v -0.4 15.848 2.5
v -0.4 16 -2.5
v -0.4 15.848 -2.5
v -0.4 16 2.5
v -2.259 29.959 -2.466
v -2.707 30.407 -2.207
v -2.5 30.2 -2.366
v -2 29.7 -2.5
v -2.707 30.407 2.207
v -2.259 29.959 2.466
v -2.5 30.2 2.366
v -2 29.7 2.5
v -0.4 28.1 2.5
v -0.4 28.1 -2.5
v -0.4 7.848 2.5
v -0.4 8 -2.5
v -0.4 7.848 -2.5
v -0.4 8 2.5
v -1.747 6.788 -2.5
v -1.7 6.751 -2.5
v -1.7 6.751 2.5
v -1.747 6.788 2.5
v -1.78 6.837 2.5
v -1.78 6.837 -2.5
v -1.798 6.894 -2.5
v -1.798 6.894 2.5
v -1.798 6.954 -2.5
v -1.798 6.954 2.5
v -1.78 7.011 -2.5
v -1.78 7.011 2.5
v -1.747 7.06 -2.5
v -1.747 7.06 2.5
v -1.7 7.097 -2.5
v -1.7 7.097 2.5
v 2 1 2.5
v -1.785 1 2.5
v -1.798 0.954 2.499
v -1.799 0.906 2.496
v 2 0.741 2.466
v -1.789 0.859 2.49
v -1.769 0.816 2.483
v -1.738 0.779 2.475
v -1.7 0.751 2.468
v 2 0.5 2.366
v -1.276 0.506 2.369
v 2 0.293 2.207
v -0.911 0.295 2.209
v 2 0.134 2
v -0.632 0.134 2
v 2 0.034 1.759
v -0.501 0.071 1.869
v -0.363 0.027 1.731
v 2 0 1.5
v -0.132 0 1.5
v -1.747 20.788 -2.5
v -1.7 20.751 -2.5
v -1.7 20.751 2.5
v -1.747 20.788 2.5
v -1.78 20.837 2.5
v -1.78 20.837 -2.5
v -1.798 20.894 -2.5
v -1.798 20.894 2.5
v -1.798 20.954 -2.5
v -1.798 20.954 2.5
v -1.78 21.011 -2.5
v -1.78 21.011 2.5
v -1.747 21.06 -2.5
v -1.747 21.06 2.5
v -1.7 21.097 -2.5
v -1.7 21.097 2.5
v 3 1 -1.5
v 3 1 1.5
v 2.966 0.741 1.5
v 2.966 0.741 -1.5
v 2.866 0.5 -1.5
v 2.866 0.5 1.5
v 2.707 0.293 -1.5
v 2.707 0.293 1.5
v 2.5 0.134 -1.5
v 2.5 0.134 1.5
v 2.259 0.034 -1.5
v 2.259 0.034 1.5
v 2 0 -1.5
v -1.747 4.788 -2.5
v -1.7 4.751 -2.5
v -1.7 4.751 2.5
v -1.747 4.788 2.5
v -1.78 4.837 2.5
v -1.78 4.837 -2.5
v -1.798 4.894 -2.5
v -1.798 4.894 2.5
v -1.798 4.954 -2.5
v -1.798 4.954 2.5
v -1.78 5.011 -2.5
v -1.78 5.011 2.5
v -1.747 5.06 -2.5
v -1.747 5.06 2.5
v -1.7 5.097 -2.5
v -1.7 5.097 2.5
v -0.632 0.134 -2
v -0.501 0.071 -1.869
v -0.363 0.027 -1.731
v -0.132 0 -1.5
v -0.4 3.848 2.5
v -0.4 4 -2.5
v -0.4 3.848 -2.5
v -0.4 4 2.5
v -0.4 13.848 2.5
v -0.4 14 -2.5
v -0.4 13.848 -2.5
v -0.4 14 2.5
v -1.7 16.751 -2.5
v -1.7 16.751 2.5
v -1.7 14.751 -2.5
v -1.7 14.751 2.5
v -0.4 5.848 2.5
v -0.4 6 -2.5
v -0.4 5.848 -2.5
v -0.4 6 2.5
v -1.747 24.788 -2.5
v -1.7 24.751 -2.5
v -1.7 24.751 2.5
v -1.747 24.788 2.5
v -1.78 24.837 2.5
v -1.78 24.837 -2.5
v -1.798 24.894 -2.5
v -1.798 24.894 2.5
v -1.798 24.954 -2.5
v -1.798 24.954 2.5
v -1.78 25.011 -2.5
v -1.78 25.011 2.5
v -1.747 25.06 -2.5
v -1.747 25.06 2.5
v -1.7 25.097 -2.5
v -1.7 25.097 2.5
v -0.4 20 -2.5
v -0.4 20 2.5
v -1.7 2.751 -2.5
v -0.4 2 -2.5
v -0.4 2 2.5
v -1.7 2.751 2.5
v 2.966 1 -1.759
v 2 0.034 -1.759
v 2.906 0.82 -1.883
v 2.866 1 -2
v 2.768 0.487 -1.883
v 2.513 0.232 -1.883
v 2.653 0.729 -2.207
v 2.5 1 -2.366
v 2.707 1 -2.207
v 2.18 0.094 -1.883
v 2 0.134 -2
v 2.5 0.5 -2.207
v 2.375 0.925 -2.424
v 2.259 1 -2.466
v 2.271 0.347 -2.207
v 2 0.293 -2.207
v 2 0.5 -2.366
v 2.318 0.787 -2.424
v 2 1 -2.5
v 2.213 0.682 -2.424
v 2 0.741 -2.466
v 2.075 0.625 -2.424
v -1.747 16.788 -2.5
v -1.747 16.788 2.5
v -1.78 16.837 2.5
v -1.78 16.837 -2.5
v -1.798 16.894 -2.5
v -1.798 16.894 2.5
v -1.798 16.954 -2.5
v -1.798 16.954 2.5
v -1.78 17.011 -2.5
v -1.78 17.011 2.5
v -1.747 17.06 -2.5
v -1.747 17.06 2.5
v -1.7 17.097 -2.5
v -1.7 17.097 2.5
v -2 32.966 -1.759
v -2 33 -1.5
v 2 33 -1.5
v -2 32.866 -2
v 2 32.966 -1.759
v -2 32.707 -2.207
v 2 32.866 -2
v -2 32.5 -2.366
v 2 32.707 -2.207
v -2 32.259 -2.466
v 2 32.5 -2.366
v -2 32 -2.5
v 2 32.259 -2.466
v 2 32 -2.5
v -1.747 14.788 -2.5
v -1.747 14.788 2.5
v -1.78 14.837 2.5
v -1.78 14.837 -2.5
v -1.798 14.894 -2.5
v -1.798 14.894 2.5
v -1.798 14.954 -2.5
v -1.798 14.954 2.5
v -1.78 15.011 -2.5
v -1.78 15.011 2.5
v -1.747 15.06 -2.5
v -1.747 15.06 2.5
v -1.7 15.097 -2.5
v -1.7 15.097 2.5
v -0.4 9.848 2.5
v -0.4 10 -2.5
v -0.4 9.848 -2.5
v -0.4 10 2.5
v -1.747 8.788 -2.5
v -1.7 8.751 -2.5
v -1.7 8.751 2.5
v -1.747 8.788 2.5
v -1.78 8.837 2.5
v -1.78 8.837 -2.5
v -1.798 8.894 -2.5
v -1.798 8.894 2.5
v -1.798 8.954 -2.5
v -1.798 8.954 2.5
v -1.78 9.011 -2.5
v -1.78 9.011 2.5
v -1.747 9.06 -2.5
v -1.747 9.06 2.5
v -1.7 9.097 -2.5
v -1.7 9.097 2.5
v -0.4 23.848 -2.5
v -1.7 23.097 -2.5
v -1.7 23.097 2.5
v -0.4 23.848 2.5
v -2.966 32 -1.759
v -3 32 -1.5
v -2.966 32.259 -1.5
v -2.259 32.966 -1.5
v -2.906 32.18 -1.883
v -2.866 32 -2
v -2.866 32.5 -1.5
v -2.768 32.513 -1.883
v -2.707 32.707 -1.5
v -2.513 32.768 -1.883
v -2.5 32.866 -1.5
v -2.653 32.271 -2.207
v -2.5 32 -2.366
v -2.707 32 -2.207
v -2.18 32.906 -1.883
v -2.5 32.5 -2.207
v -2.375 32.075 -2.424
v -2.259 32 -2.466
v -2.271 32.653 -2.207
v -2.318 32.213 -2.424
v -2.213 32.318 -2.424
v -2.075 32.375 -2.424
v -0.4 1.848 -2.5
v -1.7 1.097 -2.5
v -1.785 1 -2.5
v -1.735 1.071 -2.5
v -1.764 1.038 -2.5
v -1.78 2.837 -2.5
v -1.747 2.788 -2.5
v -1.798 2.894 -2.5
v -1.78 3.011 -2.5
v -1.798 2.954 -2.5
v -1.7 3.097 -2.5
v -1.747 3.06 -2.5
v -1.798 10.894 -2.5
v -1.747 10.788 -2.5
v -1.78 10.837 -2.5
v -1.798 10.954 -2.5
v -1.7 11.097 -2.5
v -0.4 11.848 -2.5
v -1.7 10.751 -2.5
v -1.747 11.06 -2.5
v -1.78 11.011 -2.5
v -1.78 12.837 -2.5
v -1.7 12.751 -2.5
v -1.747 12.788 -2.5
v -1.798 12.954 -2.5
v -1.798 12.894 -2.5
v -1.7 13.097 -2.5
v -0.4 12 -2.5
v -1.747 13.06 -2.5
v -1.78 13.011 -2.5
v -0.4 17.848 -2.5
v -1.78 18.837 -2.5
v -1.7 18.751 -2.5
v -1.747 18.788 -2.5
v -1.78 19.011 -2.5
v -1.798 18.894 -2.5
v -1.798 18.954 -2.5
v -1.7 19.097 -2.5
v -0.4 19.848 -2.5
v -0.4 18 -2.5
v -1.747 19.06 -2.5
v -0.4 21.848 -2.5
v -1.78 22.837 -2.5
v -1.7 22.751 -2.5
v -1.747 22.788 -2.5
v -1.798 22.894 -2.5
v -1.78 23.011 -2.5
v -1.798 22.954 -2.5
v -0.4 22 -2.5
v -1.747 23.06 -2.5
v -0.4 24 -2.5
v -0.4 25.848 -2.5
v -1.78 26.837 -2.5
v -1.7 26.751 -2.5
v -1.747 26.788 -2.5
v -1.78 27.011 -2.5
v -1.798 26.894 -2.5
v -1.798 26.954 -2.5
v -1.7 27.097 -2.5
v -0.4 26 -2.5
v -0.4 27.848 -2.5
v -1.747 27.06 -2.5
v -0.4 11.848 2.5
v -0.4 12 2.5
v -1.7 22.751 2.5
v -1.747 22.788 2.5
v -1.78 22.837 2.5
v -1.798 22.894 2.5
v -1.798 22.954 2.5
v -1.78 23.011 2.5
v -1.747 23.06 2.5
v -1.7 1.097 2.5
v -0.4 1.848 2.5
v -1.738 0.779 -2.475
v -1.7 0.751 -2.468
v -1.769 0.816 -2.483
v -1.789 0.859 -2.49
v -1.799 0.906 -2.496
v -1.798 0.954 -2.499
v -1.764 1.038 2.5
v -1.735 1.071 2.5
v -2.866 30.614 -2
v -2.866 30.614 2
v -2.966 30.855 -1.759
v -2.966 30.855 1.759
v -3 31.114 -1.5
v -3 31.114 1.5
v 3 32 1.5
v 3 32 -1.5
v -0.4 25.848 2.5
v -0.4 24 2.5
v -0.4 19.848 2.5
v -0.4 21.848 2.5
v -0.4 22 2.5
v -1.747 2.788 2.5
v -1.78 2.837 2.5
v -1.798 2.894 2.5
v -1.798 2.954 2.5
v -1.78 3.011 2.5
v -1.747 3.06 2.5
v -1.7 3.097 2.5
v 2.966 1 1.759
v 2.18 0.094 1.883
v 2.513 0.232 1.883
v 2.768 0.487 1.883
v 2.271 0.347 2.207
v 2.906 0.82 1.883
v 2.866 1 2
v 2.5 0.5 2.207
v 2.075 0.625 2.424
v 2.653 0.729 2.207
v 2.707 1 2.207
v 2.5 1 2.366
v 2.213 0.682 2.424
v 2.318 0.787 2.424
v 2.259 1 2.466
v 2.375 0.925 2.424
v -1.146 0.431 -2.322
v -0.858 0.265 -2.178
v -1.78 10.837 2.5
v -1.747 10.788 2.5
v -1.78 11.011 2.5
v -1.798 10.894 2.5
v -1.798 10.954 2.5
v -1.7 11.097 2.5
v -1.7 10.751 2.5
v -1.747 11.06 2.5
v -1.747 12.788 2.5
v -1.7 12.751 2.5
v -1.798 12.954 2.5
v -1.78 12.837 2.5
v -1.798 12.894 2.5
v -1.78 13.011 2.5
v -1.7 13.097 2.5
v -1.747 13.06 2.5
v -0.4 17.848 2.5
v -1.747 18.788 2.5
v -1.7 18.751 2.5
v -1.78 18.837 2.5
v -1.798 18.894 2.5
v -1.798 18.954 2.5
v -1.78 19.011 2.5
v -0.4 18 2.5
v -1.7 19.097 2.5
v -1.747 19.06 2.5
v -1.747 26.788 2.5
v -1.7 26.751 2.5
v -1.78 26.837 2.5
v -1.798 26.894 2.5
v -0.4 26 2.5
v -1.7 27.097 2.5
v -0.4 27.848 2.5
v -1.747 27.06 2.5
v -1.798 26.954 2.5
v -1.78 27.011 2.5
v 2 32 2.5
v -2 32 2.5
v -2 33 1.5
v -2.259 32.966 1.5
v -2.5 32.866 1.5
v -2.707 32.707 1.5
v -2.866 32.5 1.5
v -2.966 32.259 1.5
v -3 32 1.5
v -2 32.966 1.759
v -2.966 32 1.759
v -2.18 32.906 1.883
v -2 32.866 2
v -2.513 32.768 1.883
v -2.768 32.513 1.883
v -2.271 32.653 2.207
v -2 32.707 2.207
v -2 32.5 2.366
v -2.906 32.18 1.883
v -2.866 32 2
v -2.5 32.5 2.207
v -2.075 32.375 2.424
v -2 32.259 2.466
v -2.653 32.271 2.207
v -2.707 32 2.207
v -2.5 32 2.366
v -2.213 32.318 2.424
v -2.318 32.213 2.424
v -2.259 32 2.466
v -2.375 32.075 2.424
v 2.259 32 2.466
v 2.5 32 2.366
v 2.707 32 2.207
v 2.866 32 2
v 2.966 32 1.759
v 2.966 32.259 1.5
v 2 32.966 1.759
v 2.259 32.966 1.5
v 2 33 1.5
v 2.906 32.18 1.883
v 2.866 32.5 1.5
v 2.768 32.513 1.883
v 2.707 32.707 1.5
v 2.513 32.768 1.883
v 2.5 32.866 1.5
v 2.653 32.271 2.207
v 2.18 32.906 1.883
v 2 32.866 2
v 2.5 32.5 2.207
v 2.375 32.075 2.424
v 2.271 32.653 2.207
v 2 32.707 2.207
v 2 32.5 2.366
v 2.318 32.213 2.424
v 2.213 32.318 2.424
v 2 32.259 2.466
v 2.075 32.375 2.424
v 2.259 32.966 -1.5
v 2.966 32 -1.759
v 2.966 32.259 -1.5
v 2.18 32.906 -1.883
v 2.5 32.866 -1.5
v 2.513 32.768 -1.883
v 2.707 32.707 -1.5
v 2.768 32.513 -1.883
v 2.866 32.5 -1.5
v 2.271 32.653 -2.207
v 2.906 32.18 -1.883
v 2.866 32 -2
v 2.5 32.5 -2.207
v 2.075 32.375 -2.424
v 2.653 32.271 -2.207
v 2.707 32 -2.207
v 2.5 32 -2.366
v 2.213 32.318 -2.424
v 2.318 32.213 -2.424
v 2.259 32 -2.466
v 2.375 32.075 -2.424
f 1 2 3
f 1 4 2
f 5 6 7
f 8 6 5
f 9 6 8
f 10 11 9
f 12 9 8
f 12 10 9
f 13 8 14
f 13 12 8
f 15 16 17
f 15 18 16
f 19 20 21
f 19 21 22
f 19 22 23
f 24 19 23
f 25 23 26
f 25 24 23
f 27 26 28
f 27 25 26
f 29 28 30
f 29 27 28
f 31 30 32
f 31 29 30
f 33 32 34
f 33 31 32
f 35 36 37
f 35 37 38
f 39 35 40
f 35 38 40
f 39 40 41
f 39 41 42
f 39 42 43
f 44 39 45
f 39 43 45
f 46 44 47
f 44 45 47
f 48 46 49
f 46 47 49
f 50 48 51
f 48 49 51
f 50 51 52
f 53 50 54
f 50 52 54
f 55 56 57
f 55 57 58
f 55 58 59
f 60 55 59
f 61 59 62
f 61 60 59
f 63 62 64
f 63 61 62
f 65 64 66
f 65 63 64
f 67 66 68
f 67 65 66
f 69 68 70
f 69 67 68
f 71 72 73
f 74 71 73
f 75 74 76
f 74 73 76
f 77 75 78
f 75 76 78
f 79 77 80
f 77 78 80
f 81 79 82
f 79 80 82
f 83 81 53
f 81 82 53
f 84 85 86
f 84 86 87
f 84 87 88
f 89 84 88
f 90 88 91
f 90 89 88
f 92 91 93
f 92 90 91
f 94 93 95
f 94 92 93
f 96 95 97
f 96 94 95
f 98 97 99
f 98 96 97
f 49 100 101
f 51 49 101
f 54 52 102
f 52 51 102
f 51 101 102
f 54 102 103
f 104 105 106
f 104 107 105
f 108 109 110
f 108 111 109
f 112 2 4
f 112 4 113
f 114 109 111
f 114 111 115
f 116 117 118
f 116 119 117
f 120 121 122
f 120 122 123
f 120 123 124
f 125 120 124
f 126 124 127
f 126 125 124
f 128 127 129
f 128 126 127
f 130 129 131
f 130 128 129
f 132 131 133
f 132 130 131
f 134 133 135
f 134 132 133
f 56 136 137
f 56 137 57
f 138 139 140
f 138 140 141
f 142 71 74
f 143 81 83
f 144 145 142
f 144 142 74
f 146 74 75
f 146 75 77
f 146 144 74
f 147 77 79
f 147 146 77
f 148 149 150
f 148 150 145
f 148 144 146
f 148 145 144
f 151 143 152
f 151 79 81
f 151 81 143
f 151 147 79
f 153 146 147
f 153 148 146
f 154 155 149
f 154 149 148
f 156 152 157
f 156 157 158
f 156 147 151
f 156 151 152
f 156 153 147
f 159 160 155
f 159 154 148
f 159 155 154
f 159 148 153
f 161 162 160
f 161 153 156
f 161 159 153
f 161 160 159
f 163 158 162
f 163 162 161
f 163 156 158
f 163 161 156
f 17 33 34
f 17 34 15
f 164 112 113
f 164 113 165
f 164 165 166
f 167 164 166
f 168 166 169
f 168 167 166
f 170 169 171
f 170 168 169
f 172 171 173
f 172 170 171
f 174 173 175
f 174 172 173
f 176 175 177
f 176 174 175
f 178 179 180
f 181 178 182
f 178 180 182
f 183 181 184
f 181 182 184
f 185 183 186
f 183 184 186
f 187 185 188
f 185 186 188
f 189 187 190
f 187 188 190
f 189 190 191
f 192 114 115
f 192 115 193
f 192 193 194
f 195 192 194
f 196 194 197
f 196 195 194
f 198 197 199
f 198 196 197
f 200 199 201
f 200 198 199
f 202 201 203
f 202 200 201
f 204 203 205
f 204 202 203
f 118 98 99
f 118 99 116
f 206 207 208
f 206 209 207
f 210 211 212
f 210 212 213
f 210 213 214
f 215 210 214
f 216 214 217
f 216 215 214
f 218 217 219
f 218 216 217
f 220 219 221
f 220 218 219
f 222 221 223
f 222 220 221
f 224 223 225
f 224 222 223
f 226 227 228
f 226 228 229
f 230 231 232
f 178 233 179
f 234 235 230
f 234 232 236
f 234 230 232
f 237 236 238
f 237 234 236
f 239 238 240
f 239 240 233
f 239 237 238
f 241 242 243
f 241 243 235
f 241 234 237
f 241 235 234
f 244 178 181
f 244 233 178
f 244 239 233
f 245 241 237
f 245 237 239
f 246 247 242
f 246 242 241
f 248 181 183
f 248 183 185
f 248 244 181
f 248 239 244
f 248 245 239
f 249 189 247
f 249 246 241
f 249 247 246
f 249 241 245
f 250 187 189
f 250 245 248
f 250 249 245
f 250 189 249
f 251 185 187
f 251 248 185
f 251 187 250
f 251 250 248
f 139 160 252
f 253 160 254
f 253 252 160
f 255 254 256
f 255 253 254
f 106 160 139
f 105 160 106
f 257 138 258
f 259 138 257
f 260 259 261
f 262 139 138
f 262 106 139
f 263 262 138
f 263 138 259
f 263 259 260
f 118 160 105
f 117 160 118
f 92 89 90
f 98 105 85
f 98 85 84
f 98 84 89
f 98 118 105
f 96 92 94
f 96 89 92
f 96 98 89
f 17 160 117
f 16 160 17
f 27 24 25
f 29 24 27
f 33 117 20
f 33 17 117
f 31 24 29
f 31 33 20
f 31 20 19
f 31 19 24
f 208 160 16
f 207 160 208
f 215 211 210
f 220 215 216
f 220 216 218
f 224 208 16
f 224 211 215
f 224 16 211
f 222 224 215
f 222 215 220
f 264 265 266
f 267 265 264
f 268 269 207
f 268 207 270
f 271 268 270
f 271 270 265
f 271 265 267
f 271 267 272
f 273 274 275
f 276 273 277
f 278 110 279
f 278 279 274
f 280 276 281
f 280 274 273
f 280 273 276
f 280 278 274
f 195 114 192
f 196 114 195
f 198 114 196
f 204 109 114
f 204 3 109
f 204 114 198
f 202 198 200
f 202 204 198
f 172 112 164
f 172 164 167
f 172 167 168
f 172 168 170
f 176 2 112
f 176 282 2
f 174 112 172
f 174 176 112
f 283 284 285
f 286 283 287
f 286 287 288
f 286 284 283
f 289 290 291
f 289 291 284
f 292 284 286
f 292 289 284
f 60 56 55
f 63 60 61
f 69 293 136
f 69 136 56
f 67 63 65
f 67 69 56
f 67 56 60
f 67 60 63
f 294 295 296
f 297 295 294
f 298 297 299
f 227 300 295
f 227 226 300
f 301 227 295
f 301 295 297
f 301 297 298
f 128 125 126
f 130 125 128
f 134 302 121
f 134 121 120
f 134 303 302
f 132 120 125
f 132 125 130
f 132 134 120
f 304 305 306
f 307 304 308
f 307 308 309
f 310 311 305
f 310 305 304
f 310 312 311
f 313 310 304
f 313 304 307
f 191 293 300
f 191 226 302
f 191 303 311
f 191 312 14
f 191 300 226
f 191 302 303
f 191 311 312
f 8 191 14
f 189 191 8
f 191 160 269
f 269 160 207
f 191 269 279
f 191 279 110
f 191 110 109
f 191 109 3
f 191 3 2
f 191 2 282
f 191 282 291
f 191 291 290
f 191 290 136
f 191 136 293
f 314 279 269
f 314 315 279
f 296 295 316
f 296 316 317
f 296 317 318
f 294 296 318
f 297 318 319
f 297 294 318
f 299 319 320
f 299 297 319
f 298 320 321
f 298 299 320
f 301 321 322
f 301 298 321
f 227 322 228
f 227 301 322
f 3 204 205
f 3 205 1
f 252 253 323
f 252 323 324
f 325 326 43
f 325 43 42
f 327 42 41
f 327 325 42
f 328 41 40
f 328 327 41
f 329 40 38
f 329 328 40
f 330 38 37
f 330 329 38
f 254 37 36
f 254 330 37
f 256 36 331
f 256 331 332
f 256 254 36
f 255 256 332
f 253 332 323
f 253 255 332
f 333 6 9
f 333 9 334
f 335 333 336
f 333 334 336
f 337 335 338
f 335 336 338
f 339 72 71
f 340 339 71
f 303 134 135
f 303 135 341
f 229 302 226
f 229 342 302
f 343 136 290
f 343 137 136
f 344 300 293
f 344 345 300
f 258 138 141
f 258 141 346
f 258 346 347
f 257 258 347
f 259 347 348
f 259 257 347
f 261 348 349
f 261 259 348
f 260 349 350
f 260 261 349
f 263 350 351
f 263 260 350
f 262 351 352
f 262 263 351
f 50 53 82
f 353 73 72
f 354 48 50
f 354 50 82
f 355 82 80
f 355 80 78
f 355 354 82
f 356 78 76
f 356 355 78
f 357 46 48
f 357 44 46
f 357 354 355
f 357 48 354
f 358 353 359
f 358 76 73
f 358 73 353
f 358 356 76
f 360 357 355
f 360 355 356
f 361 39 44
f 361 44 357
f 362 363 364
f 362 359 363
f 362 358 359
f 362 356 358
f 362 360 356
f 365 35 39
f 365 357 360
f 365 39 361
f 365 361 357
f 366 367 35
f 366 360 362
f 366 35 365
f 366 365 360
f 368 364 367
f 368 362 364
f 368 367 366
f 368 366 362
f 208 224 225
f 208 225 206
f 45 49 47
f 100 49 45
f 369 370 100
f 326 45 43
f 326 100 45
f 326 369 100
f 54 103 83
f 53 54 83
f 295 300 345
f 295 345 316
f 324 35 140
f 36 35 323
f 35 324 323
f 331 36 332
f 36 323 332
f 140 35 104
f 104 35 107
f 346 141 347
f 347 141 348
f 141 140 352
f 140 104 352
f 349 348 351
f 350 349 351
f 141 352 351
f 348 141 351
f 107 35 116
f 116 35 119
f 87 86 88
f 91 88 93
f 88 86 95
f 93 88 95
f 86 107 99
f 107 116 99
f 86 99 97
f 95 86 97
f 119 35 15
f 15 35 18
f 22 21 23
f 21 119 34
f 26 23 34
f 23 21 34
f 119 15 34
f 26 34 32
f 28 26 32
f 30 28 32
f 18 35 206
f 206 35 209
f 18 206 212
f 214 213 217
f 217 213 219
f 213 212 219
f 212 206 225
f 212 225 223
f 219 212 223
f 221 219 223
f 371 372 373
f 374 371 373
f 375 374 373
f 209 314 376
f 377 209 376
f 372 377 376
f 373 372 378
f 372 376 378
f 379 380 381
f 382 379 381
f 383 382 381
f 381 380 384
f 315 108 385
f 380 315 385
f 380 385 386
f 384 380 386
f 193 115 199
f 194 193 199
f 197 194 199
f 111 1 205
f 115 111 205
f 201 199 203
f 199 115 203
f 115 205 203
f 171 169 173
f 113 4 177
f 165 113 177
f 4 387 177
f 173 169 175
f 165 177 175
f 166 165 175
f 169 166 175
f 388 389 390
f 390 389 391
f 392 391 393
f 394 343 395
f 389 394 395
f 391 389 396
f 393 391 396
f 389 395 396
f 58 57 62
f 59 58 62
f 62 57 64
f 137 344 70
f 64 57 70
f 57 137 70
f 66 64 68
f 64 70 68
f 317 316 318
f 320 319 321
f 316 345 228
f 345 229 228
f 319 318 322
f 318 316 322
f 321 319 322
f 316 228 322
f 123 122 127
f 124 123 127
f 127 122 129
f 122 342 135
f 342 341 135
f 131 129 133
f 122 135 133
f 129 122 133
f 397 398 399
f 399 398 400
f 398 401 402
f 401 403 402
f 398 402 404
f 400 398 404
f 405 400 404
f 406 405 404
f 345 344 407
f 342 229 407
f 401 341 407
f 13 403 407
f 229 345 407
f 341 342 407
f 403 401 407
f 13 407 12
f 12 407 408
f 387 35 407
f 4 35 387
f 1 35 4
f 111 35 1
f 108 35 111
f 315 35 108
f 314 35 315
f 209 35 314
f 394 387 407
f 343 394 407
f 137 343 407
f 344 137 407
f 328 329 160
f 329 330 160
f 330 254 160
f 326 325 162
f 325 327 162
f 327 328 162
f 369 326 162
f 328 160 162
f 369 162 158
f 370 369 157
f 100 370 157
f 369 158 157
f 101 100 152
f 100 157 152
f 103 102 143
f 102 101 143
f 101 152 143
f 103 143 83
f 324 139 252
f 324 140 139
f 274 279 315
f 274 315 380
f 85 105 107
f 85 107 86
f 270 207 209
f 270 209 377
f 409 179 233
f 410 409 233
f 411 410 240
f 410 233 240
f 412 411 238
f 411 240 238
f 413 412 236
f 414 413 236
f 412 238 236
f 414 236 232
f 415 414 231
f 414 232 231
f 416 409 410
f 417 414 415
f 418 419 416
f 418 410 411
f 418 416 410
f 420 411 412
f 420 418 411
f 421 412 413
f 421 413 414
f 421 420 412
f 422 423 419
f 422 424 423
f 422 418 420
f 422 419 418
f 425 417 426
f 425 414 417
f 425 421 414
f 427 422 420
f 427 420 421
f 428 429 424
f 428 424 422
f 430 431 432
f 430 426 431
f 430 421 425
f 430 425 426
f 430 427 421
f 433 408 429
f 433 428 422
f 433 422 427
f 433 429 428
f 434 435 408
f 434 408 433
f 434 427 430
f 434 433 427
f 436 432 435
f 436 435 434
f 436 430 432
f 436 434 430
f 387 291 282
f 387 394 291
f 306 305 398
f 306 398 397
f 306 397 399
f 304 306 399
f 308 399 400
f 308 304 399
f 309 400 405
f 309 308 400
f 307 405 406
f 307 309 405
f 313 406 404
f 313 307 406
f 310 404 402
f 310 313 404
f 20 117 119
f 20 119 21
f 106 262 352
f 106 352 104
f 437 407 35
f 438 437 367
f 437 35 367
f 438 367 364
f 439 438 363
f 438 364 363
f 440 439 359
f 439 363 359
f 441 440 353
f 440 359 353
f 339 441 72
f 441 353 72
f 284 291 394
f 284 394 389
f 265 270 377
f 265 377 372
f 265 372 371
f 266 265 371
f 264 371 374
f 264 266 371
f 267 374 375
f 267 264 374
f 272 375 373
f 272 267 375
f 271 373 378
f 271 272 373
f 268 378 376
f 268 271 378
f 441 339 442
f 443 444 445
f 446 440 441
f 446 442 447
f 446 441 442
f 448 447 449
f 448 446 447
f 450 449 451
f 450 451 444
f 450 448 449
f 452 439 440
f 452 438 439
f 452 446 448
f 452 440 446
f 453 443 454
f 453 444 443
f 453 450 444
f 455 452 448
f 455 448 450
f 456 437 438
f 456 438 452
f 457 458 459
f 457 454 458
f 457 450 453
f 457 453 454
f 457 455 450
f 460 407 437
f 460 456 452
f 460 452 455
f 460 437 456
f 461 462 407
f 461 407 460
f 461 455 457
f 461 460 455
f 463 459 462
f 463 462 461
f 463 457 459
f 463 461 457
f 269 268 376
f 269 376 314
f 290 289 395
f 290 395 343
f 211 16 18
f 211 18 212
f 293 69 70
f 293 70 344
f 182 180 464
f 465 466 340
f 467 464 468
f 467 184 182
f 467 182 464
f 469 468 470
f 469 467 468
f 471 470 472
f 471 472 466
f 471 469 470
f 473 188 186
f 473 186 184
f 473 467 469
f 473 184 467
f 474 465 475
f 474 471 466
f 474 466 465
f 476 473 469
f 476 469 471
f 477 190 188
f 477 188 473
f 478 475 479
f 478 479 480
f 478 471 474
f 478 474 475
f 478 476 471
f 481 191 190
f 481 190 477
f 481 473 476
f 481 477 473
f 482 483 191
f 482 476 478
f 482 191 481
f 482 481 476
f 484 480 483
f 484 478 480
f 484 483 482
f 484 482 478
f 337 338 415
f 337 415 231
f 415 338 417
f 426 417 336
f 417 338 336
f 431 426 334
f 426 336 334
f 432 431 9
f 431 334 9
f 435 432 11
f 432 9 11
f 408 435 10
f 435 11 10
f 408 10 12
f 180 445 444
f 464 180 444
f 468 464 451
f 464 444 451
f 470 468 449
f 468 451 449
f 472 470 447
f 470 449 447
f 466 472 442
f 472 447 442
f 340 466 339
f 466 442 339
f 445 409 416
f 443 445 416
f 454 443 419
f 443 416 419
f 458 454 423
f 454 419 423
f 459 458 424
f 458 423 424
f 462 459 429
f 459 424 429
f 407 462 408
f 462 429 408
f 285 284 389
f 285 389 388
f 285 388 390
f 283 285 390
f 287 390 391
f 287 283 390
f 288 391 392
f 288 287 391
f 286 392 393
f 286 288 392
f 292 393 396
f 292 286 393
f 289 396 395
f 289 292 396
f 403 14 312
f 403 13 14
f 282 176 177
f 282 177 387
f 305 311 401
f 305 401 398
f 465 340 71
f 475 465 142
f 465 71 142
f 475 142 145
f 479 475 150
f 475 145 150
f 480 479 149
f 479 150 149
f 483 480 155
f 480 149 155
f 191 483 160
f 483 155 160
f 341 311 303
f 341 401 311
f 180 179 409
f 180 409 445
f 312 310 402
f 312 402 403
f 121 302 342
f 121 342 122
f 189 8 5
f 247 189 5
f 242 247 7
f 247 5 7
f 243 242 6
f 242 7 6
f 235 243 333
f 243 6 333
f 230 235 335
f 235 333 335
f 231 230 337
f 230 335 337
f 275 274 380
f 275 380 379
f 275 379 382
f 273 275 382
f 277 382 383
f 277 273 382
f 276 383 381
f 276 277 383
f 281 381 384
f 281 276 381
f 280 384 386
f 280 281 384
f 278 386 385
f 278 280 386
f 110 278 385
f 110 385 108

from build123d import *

# Parameters (mm, degrees)
SKETCH1_W               = 6
SKETCH1_H               = 5
BOSS_EXTRUDE1_DEPTH     = 33
CUT_EXTRUDE1_DEPTH      = 34.51119216
CUT_EXTRUDE1_DEPTH_BACK = 34.51119216
BOSS_EXTRUDE2_DEPTH     = 5
LPATTERN1_COUNT         = 14
LPATTERN1_PITCH         = 2
FILLET1_R               = 1


with BuildPart() as part:
    # Sketch1 → Boss-Extrude1 (new body)
    with BuildSketch(Plane(origin=(0, 0, 0), x_dir=(1, 0, 0), z_dir=(0, 1, 0))):
        Rectangle(SKETCH1_W, SKETCH1_H)
    extrude(amount=BOSS_EXTRUDE1_DEPTH)

    # Sketch2 → Cut-Extrude1 (cut, two sides: drawn at the far end of the back side and taken through both)
    with BuildSketch(Plane(origin=(0, 0, -2.5), x_dir=(-1, 0, 0), z_dir=(0, 0, -1)).offset(-CUT_EXTRUDE1_DEPTH_BACK)):
        Polygon((3, 2.5), (3, 30.7), (0.4, 28.1), (0.4, 5.1), (0.4, 0), (3, 0), align=None)
    extrude(amount=CUT_EXTRUDE1_DEPTH + CUT_EXTRUDE1_DEPTH_BACK, mode=Mode.SUBTRACT)

    # Sketch3 → Boss-Extrude2 (add)
    with BuildSketch(Plane(origin=(0, 0, -2.5), x_dir=(-1, 0, 0), z_dir=(0, 0, -1))):
        with BuildLine():
            Line((0.4, 0), (1.7, 0.75055535))
            ThreePointArc((1.7, 0.75055535), (1.8, 0.923760431), (1.7, 1.096965511))
            Line((1.7, 1.096965511), (0.4, 1.847520861))
            Line((0.4, 1.847520861), (0.4, 0))
        make_face()
    boss_extrude2 = extrude(amount=-BOSS_EXTRUDE2_DEPTH)

    # LPattern1: Boss-Extrude2 ×14
    with Locations(*[(0, i * LPATTERN1_PITCH, 0) for i in range(1, LPATTERN1_COUNT)]):
        add(boss_extrude2)

    # Fillet1
    # the kernel refuses this fillet: 1 mm, written as the material it takes off along each edge
    with BuildSketch(Plane(origin=(2, 1, -1.5), x_dir=(1, 0, 0), z_dir=(0, 0, -1))) as fillet1_piece_1_section:
        Polygon((0, 0), (FILLET1_R, 0), (FILLET1_R, FILLET1_R), (0, FILLET1_R), align=None)
    fillet1_piece_1 = extrude(amount=FILLET1_R, mode=Mode.PRIVATE)
    fillet1_piece_1 = fillet1_piece_1 - Plane(origin=(2, 1, -1.5), x_dir=(-0.7071067811865475, 0.7071067811865475, 0), z_dir=(0, 0, -1)) * Sphere(FILLET1_R, mode=Mode.PRIVATE)
    add(fillet1_piece_1, mode=Mode.SUBTRACT)
    with BuildSketch(Plane(origin=(2, 1, 1.5), x_dir=(1, 0, 0), z_dir=(0, 0, 1))) as fillet1_piece_2_section:
        Polygon((0, 0), (FILLET1_R, 0), (FILLET1_R, -FILLET1_R), (0, -FILLET1_R), align=None)
    fillet1_piece_2 = extrude(amount=FILLET1_R, mode=Mode.PRIVATE)
    fillet1_piece_2 = fillet1_piece_2 - Plane(origin=(2, 1, 1.5), x_dir=(-0.7071067811865475, 0.7071067811865475, 0), z_dir=(0, 0, 1)) * Sphere(FILLET1_R, mode=Mode.PRIVATE)
    add(fillet1_piece_2, mode=Mode.SUBTRACT)
    with BuildSketch(Plane(origin=(-2, 32, -1.5), x_dir=(-1, 0, 0), z_dir=(0, 0, -1))) as fillet1_piece_3_section:
        Polygon((0, 0), (FILLET1_R, 0), (FILLET1_R, FILLET1_R), (0, FILLET1_R), align=None)
    fillet1_piece_3 = extrude(amount=FILLET1_R, mode=Mode.PRIVATE)
    fillet1_piece_3 = fillet1_piece_3 - Plane(origin=(-2, 32, -1.5), x_dir=(0.7071067811865475, -0.7071067811865475, 0), z_dir=(0, 0, -1)) * Sphere(FILLET1_R, mode=Mode.PRIVATE)
    add(fillet1_piece_3, mode=Mode.SUBTRACT)
    with BuildSketch(Plane(origin=(-2, 32, 1.5), x_dir=(-1, 0, 0), z_dir=(0, 0, 1))) as fillet1_piece_4_section:
        Polygon((0, 0), (FILLET1_R, 0), (FILLET1_R, -FILLET1_R), (0, -FILLET1_R), align=None)
    fillet1_piece_4 = extrude(amount=FILLET1_R, mode=Mode.PRIVATE)
    fillet1_piece_4 = fillet1_piece_4 - Plane(origin=(-2, 32, 1.5), x_dir=(0.7071067811865475, -0.7071067811865475, 0), z_dir=(0, 0, 1)) * Sphere(FILLET1_R, mode=Mode.PRIVATE)
    add(fillet1_piece_4, mode=Mode.SUBTRACT)
    with BuildSketch(Plane(origin=(2, 32, 1.5), x_dir=(0, 1, 0), z_dir=(0, 0, 1))) as fillet1_piece_5_section:
        Polygon((0, 0), (FILLET1_R, 0), (FILLET1_R, -FILLET1_R), (0, -FILLET1_R), align=None)
    fillet1_piece_5 = extrude(amount=FILLET1_R, mode=Mode.PRIVATE)
    fillet1_piece_5 = fillet1_piece_5 - Plane(origin=(2, 32, 1.5), x_dir=(-0.7071067811865475, -0.7071067811865475, 0), z_dir=(0, 0, 1)) * Sphere(FILLET1_R, mode=Mode.PRIVATE)
    add(fillet1_piece_5, mode=Mode.SUBTRACT)
    with BuildSketch(Plane(origin=(2, 32, -1.5), x_dir=(0, 1, 0), z_dir=(0, 0, -1))) as fillet1_piece_6_section:
        Polygon((0, 0), (FILLET1_R, 0), (FILLET1_R, FILLET1_R), (0, FILLET1_R), align=None)
    fillet1_piece_6 = extrude(amount=FILLET1_R, mode=Mode.PRIVATE)
    fillet1_piece_6 = fillet1_piece_6 - Plane(origin=(2, 32, -1.5), x_dir=(-0.7071067811865475, -0.7071067811865475, 0), z_dir=(0, 0, -1)) * Sphere(FILLET1_R, mode=Mode.PRIVATE)
    add(fillet1_piece_6, mode=Mode.SUBTRACT)
    with BuildSketch(Plane(origin=(2, 0, -2.5), x_dir=(0, 0, 1), z_dir=(-1, 0, 0))) as fillet1_piece_7:
        with BuildLine():
            CenterArc((FILLET1_R, FILLET1_R), FILLET1_R, 180, 90)
            Line((0, FILLET1_R), (0, 0))
            Line((0, 0), (FILLET1_R, 0))
        make_face()
    extrude(amount=4.9, mode=Mode.SUBTRACT)
    with BuildSketch(Plane(origin=(-2.9, 0, 2.5), x_dir=(0, 1, 0), z_dir=(1, 0, 0))) as fillet1_piece_8:
        with BuildLine():
            CenterArc((FILLET1_R, -FILLET1_R), FILLET1_R, 90, 90)
            Line((0, -FILLET1_R), (0, 0))
            Line((0, 0), (FILLET1_R, 0))
        make_face()
    extrude(amount=4.9, mode=Mode.SUBTRACT)
    with BuildSketch(Plane(origin=(-3, 33, -1.5), x_dir=(0, -1, 0), z_dir=(0, 0, 1))) as fillet1_piece_9:
        with BuildLine():
            CenterArc((FILLET1_R, FILLET1_R), FILLET1_R, 180, 90)
            Line((0, FILLET1_R), (0, 0))
            Line((0, 0), (FILLET1_R, 0))
        make_face()
    extrude(amount=3, mode=Mode.SUBTRACT)
    with BuildSketch(Plane(origin=(-3, 28.2, 2.5), x_dir=(1, 0, 0), z_dir=(0, 1, 0)), Plane(origin=(-3, 28.2, -2.5), x_dir=(0, 0, 1), z_dir=(0, 1, 0))) as fillet1_piece_10:
        with BuildLine():
            CenterArc((FILLET1_R, FILLET1_R), FILLET1_R, 180, 90)
            Line((0, FILLET1_R), (0, 0))
            Line((0, 0), (FILLET1_R, 0))
        make_face()
    extrude(amount=3.8, mode=Mode.SUBTRACT)
    with BuildSketch(Plane(origin=(-3, 30.7, 3.535533906), x_dir=(0.7071067811865411, -0.7071067811865539, 0), z_dir=(0, 0, -1))) as fillet1_piece_11:
        with BuildLine():
            CenterArc((FILLET1_R * 0.414213562373, -FILLET1_R), FILLET1_R, 90, 45)
            Line((-FILLET1_R * 0.292893218813, -FILLET1_R * 0.292893218813), (0, 0))
            Line((0, 0), (FILLET1_R * 0.414213562373, 0))
        make_face()
    extrude(amount=7.071067812, mode=Mode.SUBTRACT)
    with BuildSketch(Plane(origin=(3, 1, 2.5), x_dir=(-1, 0, 0), z_dir=(0, 1, 0)), Plane(origin=(3, 1, -2.5), x_dir=(0, 0, 1), z_dir=(0, 1, 0))) as fillet1_piece_12:
        with BuildLine():
            CenterArc((FILLET1_R, -FILLET1_R), FILLET1_R, 90, 90)
            Line((0, -FILLET1_R), (0, 0))
            Line((0, 0), (FILLET1_R, 0))
        make_face()
    extrude(amount=31, mode=Mode.SUBTRACT)
    with BuildSketch(Plane(origin=(3, 33, 1.5), x_dir=(-1, 0, 0), z_dir=(0, 0, -1)), Plane(origin=(3, 0, 1.5), x_dir=(0, 1, 0), z_dir=(0, 0, -1))) as fillet1_piece_13:
        with BuildLine():
            CenterArc((FILLET1_R, -FILLET1_R), FILLET1_R, 90, 90)
            Line((0, -FILLET1_R), (0, 0))
            Line((0, 0), (FILLET1_R, 0))
        make_face()
    extrude(amount=3, mode=Mode.SUBTRACT)
    with BuildSketch(Plane(origin=(-2, 33, 2.5), x_dir=(0, -1, 0), z_dir=(1, 0, 0))) as fillet1_piece_14:
        with BuildLine():
            CenterArc((FILLET1_R, FILLET1_R), FILLET1_R, 180, 90)
            Line((0, FILLET1_R), (0, 0))
            Line((0, 0), (FILLET1_R, 0))
        make_face()
    extrude(amount=4, mode=Mode.SUBTRACT)
    with BuildSketch(Plane(origin=(2, 33, -2.5), x_dir=(0, 0, 1), z_dir=(-1, 0, 0))) as fillet1_piece_15:
        with BuildLine():
            CenterArc((FILLET1_R, -FILLET1_R), FILLET1_R, 90, 90)
            Line((0, -FILLET1_R), (0, 0))
            Line((0, 0), (FILLET1_R, 0))
        make_face()
    extrude(amount=4, mode=Mode.SUBTRACT)
    with BuildSketch(Plane(origin=(-0.4, 0, -3.169872981), x_dir=(1, 0, 0), z_dir=(0, 0, 1))) as fillet1_piece_16:
        with BuildLine():
            CenterArc((FILLET1_R * 0.267949192431, FILLET1_R), FILLET1_R, 240, 30)
            Line((-FILLET1_R * 0.232050807569, FILLET1_R * 0.133974596216), (0, 0))
            Line((0, 0), (FILLET1_R * 0.267949192431, 0))
        make_face()
    extrude(amount=6.339745962, mode=Mode.SUBTRACT)


solid = part.part
